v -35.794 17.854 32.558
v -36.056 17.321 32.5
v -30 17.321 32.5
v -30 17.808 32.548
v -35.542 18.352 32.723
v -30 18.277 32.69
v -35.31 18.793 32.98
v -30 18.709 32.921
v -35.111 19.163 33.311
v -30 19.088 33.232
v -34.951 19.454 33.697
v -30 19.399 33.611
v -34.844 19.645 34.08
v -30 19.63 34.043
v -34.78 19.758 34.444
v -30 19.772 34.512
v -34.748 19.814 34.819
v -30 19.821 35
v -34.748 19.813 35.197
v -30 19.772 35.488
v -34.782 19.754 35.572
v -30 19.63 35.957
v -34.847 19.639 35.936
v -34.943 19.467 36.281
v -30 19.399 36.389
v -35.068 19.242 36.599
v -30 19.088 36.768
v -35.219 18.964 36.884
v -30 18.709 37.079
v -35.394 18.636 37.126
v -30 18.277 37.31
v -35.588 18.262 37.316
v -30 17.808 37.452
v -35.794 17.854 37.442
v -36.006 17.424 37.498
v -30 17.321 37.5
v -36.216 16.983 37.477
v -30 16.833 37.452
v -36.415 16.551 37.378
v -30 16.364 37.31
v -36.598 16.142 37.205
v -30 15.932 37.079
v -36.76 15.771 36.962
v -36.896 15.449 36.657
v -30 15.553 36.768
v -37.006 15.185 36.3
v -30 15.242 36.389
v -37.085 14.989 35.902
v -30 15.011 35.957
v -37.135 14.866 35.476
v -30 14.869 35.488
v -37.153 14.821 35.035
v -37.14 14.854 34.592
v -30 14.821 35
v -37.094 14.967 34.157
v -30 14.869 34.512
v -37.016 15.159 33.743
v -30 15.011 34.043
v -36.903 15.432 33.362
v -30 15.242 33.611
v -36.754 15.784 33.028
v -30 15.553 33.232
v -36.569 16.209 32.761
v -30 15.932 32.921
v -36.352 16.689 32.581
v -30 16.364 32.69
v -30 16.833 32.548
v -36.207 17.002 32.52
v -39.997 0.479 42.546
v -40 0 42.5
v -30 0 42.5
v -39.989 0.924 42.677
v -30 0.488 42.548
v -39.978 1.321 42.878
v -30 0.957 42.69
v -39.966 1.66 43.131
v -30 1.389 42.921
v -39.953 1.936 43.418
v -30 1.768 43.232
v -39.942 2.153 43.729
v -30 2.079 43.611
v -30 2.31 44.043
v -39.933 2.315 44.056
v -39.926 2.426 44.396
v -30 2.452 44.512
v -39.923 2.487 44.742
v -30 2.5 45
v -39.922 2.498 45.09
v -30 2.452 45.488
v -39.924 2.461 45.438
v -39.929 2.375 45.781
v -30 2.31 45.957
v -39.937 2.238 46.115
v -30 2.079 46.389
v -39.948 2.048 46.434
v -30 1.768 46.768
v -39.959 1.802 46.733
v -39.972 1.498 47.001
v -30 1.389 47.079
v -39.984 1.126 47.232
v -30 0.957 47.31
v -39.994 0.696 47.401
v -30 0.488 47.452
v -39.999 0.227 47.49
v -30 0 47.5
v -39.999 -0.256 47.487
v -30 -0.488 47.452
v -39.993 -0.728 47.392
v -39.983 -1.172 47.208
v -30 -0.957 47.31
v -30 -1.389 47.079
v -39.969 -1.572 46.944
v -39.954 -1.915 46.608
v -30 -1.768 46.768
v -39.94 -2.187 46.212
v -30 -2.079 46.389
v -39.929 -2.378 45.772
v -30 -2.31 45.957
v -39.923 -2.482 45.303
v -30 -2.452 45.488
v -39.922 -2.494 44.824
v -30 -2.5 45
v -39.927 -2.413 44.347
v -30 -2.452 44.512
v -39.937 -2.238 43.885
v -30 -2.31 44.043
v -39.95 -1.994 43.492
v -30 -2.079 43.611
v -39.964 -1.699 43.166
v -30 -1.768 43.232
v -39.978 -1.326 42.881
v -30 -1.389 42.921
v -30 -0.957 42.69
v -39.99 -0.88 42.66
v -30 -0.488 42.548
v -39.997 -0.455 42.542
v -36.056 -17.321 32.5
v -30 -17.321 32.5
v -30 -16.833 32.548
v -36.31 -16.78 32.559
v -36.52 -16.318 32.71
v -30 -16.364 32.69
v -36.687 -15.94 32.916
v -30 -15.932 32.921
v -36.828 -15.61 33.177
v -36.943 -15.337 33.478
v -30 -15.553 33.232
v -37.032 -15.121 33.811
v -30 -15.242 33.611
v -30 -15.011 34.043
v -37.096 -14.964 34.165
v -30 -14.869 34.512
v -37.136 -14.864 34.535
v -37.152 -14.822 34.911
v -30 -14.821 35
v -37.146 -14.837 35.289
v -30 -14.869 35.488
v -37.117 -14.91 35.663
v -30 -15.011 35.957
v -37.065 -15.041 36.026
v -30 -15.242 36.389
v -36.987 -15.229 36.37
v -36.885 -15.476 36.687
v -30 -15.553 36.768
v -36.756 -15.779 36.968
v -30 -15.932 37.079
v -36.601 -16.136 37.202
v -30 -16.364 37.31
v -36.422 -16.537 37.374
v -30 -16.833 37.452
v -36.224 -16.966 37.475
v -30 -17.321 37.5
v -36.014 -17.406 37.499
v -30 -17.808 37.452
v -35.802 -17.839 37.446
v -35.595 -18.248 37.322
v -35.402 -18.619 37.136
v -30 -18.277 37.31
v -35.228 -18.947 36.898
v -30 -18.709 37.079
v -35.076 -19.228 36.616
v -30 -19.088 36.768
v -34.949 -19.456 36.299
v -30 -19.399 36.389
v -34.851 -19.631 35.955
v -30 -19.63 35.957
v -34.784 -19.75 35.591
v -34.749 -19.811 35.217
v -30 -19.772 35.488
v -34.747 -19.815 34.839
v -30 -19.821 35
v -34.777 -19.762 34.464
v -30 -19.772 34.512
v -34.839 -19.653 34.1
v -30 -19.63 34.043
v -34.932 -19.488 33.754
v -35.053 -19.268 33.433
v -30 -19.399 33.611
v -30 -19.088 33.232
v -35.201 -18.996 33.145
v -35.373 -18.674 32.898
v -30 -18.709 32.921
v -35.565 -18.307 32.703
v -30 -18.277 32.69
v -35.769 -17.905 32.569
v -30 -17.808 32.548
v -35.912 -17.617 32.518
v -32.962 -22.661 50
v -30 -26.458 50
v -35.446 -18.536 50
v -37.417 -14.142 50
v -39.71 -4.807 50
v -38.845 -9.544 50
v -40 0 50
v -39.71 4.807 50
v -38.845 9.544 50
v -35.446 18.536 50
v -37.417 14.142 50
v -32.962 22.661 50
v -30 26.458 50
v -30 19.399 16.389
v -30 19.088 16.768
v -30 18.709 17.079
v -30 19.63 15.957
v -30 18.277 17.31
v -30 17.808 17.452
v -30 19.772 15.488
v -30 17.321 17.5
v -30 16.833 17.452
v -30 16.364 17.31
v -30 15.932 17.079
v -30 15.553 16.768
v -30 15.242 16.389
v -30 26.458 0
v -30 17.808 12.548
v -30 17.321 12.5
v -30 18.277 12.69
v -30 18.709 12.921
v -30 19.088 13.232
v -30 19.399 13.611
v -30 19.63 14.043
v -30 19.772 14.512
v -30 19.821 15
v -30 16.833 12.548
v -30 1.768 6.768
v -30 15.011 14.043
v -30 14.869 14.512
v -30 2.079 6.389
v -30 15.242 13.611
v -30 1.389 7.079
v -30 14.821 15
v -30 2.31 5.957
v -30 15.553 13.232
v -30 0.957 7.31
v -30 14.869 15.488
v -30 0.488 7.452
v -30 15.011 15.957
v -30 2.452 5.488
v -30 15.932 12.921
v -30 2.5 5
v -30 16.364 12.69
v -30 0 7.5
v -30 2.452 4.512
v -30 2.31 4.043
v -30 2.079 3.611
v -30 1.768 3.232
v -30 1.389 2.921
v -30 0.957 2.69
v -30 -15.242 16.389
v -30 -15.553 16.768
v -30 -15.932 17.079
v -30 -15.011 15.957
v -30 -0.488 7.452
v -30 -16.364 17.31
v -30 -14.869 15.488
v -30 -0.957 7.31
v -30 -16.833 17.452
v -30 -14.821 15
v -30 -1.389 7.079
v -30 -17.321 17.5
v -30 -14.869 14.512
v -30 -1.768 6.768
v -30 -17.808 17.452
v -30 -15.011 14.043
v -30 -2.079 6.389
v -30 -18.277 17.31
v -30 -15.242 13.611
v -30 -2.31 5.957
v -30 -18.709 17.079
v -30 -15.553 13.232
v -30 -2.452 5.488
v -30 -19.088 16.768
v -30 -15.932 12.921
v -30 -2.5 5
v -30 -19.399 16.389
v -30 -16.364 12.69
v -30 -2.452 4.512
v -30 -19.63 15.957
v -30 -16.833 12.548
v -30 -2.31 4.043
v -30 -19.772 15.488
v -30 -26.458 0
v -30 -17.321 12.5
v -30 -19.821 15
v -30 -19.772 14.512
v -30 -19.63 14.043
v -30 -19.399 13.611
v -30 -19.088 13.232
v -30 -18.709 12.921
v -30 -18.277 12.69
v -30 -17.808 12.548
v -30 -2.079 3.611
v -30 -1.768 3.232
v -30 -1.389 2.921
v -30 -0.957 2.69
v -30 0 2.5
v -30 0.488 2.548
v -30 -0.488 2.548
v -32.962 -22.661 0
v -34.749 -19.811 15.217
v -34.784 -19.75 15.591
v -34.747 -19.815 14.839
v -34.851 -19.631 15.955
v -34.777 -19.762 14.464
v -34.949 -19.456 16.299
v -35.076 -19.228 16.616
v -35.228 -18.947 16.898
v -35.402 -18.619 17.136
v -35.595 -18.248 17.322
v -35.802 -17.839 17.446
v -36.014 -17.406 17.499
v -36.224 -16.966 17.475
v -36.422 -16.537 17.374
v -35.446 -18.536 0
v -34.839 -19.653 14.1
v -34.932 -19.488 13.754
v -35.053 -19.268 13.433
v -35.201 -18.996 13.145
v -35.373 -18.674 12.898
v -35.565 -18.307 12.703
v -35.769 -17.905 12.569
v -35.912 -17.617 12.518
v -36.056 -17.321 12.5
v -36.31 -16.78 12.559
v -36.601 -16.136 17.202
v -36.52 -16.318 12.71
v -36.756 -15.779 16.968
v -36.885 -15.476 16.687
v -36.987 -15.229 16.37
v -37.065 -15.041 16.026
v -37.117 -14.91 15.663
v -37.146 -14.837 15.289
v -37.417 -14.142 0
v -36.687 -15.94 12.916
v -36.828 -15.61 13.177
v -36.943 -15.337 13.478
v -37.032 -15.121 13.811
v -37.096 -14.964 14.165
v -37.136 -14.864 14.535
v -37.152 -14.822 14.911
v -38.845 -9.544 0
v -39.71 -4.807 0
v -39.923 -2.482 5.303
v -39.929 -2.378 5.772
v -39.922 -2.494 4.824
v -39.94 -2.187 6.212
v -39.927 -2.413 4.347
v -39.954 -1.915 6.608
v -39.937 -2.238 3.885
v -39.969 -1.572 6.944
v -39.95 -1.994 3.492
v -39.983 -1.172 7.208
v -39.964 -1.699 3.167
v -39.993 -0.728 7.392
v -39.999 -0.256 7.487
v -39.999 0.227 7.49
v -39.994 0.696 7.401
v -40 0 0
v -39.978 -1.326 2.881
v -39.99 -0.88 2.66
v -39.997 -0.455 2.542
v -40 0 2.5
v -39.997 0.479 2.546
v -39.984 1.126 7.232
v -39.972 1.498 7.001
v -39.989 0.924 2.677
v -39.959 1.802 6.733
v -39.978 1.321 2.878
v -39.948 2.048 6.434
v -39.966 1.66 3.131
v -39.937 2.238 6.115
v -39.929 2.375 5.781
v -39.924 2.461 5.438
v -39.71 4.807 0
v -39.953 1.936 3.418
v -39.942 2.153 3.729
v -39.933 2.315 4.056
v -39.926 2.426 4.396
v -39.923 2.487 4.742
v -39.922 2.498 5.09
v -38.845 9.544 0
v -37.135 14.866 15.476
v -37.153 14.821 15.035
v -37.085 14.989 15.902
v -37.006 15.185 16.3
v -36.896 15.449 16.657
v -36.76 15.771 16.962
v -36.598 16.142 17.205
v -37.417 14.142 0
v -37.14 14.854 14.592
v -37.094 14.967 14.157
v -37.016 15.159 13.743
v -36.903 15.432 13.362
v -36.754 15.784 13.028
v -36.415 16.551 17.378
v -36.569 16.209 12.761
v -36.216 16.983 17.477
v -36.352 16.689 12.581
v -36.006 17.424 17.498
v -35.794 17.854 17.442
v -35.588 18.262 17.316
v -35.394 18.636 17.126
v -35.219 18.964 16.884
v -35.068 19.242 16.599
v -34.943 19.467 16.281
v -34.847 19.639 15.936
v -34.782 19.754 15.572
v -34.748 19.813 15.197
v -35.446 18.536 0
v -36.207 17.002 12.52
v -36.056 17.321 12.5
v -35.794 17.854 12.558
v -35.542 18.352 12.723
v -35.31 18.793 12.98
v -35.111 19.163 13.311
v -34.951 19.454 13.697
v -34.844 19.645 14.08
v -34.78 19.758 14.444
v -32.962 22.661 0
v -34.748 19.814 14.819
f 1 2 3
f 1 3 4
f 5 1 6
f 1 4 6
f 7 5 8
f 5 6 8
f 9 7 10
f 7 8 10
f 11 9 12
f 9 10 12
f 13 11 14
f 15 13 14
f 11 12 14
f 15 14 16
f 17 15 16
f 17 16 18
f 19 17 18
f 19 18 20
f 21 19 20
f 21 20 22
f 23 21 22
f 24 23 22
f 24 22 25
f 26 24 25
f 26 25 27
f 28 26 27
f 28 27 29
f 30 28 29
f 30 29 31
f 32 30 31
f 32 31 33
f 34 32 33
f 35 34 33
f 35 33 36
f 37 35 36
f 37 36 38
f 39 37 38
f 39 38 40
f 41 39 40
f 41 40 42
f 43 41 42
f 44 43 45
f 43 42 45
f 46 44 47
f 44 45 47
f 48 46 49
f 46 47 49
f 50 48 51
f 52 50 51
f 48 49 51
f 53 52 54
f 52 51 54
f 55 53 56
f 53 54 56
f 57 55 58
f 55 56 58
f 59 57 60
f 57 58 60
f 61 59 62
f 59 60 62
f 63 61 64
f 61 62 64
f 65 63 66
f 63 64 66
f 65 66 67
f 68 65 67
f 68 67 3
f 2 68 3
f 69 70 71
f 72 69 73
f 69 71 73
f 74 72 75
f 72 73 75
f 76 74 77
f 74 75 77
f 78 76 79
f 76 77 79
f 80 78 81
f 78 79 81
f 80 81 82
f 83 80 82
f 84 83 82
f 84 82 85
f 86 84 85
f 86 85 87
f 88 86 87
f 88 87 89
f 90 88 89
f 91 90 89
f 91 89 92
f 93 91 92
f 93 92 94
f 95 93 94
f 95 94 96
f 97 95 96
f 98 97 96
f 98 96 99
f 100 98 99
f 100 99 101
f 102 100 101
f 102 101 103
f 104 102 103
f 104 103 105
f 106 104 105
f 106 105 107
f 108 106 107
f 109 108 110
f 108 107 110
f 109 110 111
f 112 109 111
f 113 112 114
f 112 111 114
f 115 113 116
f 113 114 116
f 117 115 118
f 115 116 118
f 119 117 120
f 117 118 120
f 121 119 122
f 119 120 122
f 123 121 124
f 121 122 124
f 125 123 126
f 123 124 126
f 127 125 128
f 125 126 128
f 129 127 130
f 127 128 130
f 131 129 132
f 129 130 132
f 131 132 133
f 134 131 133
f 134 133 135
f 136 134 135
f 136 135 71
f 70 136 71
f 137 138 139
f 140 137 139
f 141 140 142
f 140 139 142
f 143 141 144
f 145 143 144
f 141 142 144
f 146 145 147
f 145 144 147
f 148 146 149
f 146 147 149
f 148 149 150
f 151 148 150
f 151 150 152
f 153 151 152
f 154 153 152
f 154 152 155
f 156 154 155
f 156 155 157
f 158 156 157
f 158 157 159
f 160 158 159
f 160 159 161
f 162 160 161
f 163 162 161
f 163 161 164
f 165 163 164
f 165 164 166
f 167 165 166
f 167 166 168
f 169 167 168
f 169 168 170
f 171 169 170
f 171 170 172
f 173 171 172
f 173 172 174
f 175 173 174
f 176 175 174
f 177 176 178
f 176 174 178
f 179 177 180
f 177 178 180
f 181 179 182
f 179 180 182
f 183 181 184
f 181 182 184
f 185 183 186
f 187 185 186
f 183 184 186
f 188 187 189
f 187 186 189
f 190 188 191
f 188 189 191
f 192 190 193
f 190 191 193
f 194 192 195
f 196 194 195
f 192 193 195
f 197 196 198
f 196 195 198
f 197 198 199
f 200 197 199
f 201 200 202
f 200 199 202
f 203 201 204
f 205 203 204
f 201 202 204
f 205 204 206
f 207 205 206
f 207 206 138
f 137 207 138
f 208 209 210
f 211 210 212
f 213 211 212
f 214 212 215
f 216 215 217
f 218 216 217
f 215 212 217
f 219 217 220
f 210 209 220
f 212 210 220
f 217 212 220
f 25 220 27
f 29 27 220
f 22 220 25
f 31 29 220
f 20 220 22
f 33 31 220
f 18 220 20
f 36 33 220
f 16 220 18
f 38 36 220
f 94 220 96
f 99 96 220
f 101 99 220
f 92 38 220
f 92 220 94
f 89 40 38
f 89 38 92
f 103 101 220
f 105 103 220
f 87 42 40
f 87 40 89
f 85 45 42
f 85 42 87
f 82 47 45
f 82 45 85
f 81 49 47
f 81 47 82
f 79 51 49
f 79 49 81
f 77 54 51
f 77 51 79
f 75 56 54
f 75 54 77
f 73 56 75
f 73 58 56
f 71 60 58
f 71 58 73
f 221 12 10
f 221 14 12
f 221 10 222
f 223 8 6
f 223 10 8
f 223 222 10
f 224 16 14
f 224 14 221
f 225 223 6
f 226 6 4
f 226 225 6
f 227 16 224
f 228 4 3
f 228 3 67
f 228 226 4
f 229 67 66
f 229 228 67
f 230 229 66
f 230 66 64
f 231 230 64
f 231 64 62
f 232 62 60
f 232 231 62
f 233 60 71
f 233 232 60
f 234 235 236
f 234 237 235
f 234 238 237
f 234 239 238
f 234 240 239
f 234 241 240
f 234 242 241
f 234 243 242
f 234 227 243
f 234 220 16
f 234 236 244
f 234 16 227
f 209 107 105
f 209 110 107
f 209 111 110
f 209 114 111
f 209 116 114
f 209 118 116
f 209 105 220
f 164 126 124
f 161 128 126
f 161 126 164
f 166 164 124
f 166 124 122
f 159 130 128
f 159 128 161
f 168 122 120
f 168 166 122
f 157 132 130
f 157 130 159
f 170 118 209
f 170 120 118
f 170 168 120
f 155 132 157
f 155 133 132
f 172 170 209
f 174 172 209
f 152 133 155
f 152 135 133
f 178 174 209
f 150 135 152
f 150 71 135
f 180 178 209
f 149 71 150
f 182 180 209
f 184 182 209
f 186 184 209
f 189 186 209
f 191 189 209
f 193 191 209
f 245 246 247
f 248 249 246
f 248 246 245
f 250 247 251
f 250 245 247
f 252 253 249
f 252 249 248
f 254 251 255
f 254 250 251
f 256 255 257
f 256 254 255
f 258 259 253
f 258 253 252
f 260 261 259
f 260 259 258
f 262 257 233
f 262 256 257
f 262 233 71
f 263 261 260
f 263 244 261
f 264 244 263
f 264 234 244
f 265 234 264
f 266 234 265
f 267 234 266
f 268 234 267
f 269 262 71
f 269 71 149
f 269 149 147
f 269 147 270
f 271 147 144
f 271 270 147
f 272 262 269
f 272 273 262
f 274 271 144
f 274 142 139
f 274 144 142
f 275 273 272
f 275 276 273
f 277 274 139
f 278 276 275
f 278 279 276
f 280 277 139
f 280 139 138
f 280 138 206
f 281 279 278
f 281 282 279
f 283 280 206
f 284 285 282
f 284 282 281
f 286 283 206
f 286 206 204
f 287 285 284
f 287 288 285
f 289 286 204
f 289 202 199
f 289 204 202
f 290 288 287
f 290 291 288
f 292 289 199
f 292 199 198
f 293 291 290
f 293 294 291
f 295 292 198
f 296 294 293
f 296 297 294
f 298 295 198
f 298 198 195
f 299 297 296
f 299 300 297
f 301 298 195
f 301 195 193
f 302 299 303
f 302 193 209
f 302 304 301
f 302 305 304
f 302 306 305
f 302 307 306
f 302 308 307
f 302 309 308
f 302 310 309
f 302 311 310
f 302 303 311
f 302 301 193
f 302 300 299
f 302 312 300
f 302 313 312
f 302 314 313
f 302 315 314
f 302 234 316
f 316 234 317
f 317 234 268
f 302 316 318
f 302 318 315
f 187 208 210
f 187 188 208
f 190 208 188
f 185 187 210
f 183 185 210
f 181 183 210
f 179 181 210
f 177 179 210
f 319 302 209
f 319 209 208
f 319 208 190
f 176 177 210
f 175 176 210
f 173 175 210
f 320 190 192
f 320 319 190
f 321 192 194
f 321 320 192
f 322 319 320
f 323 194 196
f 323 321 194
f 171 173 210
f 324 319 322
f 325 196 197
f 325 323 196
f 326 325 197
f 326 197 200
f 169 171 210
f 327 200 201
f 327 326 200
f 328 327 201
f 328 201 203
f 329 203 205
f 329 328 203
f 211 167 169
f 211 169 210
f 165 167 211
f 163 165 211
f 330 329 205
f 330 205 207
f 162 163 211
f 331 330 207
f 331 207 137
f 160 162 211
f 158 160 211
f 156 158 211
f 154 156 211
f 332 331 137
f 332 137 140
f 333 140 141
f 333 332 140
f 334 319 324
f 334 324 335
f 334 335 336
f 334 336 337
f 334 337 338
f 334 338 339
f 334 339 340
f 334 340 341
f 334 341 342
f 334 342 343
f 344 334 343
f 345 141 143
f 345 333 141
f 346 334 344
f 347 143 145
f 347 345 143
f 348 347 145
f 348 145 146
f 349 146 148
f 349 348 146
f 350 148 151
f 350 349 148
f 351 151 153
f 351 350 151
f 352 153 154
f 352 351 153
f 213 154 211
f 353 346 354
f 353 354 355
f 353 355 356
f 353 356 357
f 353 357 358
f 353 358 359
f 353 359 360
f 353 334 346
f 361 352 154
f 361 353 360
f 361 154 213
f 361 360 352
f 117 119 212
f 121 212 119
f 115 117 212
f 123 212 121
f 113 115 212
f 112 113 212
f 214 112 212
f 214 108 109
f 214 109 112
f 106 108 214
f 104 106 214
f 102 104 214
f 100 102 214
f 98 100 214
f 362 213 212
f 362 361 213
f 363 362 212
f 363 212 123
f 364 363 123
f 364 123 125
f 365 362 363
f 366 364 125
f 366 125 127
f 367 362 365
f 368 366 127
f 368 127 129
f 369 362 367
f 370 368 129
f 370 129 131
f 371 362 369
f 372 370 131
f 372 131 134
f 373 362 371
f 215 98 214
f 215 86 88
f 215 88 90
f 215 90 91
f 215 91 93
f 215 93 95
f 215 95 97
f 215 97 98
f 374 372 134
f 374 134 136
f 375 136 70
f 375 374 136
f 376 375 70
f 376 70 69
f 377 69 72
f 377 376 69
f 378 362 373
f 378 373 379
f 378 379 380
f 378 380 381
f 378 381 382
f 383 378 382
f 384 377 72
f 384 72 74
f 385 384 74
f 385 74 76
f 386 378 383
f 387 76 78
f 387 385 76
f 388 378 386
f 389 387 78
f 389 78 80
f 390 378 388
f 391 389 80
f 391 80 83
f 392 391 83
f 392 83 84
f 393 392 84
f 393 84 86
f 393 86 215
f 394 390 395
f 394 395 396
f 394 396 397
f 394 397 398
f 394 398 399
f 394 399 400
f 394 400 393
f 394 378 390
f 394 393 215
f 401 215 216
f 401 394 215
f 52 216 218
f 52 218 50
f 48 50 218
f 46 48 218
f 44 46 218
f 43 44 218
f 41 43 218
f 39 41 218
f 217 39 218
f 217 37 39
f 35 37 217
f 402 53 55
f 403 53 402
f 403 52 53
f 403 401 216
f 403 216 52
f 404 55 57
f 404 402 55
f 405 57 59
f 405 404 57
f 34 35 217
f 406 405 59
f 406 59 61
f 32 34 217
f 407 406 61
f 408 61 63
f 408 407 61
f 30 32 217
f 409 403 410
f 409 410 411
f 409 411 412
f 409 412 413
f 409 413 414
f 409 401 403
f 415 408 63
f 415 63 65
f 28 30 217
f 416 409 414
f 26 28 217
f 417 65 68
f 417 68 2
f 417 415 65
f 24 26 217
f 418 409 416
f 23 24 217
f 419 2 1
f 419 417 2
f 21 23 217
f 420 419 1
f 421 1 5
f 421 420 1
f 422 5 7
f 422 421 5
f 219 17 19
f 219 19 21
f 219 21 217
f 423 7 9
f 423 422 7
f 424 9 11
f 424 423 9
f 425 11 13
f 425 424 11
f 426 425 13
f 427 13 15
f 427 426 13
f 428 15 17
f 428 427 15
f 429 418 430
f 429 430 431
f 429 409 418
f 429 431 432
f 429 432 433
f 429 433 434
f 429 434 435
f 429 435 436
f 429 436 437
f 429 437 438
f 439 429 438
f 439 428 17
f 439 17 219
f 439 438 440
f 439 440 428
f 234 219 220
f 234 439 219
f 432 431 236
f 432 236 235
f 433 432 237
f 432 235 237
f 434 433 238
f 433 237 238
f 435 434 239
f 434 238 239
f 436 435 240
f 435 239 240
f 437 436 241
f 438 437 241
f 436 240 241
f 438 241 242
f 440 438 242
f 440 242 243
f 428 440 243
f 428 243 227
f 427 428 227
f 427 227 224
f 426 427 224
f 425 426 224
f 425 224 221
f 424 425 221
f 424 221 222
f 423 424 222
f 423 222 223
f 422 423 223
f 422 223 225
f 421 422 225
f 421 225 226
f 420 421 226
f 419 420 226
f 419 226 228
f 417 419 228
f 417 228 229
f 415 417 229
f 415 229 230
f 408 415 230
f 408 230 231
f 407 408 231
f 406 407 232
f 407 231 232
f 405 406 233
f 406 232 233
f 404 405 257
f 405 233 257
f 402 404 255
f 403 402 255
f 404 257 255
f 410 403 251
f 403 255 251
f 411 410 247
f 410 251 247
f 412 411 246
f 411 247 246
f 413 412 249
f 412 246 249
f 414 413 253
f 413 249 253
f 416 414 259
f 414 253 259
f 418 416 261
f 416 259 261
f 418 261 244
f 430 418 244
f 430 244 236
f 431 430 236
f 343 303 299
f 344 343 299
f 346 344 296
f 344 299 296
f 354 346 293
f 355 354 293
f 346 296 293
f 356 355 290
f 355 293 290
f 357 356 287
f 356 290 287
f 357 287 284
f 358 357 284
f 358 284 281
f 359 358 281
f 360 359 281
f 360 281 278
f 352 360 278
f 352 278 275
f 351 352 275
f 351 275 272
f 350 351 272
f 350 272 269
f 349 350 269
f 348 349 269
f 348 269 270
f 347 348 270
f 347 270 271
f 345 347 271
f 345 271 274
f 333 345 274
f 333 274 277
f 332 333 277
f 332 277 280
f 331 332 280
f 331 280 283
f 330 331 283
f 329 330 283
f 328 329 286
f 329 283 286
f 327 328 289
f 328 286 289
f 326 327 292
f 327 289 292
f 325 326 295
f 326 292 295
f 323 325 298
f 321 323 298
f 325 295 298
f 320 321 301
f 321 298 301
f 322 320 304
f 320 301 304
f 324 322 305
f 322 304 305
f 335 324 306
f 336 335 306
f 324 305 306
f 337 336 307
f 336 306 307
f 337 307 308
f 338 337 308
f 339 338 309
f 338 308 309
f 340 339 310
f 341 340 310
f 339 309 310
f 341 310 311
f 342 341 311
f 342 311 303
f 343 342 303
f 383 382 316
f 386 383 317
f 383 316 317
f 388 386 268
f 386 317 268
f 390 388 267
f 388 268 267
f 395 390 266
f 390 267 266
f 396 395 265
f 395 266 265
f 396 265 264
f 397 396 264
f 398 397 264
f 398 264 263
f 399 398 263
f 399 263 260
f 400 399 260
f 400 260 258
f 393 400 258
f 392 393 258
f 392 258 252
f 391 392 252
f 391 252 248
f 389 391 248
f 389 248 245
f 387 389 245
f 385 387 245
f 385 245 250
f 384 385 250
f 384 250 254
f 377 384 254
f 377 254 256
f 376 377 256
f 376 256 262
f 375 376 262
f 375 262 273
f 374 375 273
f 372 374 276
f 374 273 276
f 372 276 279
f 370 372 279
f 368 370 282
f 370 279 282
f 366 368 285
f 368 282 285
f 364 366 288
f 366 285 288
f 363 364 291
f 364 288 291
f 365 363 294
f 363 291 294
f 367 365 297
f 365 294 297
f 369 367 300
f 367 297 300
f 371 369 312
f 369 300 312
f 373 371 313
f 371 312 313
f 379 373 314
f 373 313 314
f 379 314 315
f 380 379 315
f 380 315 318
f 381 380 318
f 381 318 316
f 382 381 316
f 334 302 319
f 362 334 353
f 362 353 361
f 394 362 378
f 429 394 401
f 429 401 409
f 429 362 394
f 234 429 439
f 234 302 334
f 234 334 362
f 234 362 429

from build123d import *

# Parameters (mm, degrees)
BOSS_EXTRUDE1_DEPTH = 50
SKETCH3_R           = 2.5
CUT_EXTRUDE1_DEPTH  = 58.445626465


with BuildPart() as part:
    # Sketch2 → Boss-Extrude1 (new body)
    with BuildSketch(Plane.XY):
        with BuildLine():
            Line((-30, 26.457513111), (-30, -26.457513111))
            ThreePointArc((-30, -26.457513111), (-40, 0), (-30, 26.457513111))
        make_face()
    extrude(amount=BOSS_EXTRUDE1_DEPTH)

    # Sketch3 → Cut-Extrude1 (cut, through all)
    with BuildSketch(Plane(origin=(-30, 0, 0), x_dir=(0, 0, -1), z_dir=(1, 0, 0))):
        with Locations((-5, 0)):
            Circle(SKETCH3_R)
        with Locations((-15, -17.320508076)):
            Circle(SKETCH3_R)
        with Locations((-35, -17.320508076)):
            Circle(SKETCH3_R)
        with Locations((-45, 0)):
            Circle(SKETCH3_R)
        with Locations((-35, 17.320508076)):
            Circle(SKETCH3_R)
        with Locations((-15, 17.320508076)):
            Circle(SKETCH3_R)
    extrude(amount=-CUT_EXTRUDE1_DEPTH, mode=Mode.SUBTRACT)


solid = part.part
